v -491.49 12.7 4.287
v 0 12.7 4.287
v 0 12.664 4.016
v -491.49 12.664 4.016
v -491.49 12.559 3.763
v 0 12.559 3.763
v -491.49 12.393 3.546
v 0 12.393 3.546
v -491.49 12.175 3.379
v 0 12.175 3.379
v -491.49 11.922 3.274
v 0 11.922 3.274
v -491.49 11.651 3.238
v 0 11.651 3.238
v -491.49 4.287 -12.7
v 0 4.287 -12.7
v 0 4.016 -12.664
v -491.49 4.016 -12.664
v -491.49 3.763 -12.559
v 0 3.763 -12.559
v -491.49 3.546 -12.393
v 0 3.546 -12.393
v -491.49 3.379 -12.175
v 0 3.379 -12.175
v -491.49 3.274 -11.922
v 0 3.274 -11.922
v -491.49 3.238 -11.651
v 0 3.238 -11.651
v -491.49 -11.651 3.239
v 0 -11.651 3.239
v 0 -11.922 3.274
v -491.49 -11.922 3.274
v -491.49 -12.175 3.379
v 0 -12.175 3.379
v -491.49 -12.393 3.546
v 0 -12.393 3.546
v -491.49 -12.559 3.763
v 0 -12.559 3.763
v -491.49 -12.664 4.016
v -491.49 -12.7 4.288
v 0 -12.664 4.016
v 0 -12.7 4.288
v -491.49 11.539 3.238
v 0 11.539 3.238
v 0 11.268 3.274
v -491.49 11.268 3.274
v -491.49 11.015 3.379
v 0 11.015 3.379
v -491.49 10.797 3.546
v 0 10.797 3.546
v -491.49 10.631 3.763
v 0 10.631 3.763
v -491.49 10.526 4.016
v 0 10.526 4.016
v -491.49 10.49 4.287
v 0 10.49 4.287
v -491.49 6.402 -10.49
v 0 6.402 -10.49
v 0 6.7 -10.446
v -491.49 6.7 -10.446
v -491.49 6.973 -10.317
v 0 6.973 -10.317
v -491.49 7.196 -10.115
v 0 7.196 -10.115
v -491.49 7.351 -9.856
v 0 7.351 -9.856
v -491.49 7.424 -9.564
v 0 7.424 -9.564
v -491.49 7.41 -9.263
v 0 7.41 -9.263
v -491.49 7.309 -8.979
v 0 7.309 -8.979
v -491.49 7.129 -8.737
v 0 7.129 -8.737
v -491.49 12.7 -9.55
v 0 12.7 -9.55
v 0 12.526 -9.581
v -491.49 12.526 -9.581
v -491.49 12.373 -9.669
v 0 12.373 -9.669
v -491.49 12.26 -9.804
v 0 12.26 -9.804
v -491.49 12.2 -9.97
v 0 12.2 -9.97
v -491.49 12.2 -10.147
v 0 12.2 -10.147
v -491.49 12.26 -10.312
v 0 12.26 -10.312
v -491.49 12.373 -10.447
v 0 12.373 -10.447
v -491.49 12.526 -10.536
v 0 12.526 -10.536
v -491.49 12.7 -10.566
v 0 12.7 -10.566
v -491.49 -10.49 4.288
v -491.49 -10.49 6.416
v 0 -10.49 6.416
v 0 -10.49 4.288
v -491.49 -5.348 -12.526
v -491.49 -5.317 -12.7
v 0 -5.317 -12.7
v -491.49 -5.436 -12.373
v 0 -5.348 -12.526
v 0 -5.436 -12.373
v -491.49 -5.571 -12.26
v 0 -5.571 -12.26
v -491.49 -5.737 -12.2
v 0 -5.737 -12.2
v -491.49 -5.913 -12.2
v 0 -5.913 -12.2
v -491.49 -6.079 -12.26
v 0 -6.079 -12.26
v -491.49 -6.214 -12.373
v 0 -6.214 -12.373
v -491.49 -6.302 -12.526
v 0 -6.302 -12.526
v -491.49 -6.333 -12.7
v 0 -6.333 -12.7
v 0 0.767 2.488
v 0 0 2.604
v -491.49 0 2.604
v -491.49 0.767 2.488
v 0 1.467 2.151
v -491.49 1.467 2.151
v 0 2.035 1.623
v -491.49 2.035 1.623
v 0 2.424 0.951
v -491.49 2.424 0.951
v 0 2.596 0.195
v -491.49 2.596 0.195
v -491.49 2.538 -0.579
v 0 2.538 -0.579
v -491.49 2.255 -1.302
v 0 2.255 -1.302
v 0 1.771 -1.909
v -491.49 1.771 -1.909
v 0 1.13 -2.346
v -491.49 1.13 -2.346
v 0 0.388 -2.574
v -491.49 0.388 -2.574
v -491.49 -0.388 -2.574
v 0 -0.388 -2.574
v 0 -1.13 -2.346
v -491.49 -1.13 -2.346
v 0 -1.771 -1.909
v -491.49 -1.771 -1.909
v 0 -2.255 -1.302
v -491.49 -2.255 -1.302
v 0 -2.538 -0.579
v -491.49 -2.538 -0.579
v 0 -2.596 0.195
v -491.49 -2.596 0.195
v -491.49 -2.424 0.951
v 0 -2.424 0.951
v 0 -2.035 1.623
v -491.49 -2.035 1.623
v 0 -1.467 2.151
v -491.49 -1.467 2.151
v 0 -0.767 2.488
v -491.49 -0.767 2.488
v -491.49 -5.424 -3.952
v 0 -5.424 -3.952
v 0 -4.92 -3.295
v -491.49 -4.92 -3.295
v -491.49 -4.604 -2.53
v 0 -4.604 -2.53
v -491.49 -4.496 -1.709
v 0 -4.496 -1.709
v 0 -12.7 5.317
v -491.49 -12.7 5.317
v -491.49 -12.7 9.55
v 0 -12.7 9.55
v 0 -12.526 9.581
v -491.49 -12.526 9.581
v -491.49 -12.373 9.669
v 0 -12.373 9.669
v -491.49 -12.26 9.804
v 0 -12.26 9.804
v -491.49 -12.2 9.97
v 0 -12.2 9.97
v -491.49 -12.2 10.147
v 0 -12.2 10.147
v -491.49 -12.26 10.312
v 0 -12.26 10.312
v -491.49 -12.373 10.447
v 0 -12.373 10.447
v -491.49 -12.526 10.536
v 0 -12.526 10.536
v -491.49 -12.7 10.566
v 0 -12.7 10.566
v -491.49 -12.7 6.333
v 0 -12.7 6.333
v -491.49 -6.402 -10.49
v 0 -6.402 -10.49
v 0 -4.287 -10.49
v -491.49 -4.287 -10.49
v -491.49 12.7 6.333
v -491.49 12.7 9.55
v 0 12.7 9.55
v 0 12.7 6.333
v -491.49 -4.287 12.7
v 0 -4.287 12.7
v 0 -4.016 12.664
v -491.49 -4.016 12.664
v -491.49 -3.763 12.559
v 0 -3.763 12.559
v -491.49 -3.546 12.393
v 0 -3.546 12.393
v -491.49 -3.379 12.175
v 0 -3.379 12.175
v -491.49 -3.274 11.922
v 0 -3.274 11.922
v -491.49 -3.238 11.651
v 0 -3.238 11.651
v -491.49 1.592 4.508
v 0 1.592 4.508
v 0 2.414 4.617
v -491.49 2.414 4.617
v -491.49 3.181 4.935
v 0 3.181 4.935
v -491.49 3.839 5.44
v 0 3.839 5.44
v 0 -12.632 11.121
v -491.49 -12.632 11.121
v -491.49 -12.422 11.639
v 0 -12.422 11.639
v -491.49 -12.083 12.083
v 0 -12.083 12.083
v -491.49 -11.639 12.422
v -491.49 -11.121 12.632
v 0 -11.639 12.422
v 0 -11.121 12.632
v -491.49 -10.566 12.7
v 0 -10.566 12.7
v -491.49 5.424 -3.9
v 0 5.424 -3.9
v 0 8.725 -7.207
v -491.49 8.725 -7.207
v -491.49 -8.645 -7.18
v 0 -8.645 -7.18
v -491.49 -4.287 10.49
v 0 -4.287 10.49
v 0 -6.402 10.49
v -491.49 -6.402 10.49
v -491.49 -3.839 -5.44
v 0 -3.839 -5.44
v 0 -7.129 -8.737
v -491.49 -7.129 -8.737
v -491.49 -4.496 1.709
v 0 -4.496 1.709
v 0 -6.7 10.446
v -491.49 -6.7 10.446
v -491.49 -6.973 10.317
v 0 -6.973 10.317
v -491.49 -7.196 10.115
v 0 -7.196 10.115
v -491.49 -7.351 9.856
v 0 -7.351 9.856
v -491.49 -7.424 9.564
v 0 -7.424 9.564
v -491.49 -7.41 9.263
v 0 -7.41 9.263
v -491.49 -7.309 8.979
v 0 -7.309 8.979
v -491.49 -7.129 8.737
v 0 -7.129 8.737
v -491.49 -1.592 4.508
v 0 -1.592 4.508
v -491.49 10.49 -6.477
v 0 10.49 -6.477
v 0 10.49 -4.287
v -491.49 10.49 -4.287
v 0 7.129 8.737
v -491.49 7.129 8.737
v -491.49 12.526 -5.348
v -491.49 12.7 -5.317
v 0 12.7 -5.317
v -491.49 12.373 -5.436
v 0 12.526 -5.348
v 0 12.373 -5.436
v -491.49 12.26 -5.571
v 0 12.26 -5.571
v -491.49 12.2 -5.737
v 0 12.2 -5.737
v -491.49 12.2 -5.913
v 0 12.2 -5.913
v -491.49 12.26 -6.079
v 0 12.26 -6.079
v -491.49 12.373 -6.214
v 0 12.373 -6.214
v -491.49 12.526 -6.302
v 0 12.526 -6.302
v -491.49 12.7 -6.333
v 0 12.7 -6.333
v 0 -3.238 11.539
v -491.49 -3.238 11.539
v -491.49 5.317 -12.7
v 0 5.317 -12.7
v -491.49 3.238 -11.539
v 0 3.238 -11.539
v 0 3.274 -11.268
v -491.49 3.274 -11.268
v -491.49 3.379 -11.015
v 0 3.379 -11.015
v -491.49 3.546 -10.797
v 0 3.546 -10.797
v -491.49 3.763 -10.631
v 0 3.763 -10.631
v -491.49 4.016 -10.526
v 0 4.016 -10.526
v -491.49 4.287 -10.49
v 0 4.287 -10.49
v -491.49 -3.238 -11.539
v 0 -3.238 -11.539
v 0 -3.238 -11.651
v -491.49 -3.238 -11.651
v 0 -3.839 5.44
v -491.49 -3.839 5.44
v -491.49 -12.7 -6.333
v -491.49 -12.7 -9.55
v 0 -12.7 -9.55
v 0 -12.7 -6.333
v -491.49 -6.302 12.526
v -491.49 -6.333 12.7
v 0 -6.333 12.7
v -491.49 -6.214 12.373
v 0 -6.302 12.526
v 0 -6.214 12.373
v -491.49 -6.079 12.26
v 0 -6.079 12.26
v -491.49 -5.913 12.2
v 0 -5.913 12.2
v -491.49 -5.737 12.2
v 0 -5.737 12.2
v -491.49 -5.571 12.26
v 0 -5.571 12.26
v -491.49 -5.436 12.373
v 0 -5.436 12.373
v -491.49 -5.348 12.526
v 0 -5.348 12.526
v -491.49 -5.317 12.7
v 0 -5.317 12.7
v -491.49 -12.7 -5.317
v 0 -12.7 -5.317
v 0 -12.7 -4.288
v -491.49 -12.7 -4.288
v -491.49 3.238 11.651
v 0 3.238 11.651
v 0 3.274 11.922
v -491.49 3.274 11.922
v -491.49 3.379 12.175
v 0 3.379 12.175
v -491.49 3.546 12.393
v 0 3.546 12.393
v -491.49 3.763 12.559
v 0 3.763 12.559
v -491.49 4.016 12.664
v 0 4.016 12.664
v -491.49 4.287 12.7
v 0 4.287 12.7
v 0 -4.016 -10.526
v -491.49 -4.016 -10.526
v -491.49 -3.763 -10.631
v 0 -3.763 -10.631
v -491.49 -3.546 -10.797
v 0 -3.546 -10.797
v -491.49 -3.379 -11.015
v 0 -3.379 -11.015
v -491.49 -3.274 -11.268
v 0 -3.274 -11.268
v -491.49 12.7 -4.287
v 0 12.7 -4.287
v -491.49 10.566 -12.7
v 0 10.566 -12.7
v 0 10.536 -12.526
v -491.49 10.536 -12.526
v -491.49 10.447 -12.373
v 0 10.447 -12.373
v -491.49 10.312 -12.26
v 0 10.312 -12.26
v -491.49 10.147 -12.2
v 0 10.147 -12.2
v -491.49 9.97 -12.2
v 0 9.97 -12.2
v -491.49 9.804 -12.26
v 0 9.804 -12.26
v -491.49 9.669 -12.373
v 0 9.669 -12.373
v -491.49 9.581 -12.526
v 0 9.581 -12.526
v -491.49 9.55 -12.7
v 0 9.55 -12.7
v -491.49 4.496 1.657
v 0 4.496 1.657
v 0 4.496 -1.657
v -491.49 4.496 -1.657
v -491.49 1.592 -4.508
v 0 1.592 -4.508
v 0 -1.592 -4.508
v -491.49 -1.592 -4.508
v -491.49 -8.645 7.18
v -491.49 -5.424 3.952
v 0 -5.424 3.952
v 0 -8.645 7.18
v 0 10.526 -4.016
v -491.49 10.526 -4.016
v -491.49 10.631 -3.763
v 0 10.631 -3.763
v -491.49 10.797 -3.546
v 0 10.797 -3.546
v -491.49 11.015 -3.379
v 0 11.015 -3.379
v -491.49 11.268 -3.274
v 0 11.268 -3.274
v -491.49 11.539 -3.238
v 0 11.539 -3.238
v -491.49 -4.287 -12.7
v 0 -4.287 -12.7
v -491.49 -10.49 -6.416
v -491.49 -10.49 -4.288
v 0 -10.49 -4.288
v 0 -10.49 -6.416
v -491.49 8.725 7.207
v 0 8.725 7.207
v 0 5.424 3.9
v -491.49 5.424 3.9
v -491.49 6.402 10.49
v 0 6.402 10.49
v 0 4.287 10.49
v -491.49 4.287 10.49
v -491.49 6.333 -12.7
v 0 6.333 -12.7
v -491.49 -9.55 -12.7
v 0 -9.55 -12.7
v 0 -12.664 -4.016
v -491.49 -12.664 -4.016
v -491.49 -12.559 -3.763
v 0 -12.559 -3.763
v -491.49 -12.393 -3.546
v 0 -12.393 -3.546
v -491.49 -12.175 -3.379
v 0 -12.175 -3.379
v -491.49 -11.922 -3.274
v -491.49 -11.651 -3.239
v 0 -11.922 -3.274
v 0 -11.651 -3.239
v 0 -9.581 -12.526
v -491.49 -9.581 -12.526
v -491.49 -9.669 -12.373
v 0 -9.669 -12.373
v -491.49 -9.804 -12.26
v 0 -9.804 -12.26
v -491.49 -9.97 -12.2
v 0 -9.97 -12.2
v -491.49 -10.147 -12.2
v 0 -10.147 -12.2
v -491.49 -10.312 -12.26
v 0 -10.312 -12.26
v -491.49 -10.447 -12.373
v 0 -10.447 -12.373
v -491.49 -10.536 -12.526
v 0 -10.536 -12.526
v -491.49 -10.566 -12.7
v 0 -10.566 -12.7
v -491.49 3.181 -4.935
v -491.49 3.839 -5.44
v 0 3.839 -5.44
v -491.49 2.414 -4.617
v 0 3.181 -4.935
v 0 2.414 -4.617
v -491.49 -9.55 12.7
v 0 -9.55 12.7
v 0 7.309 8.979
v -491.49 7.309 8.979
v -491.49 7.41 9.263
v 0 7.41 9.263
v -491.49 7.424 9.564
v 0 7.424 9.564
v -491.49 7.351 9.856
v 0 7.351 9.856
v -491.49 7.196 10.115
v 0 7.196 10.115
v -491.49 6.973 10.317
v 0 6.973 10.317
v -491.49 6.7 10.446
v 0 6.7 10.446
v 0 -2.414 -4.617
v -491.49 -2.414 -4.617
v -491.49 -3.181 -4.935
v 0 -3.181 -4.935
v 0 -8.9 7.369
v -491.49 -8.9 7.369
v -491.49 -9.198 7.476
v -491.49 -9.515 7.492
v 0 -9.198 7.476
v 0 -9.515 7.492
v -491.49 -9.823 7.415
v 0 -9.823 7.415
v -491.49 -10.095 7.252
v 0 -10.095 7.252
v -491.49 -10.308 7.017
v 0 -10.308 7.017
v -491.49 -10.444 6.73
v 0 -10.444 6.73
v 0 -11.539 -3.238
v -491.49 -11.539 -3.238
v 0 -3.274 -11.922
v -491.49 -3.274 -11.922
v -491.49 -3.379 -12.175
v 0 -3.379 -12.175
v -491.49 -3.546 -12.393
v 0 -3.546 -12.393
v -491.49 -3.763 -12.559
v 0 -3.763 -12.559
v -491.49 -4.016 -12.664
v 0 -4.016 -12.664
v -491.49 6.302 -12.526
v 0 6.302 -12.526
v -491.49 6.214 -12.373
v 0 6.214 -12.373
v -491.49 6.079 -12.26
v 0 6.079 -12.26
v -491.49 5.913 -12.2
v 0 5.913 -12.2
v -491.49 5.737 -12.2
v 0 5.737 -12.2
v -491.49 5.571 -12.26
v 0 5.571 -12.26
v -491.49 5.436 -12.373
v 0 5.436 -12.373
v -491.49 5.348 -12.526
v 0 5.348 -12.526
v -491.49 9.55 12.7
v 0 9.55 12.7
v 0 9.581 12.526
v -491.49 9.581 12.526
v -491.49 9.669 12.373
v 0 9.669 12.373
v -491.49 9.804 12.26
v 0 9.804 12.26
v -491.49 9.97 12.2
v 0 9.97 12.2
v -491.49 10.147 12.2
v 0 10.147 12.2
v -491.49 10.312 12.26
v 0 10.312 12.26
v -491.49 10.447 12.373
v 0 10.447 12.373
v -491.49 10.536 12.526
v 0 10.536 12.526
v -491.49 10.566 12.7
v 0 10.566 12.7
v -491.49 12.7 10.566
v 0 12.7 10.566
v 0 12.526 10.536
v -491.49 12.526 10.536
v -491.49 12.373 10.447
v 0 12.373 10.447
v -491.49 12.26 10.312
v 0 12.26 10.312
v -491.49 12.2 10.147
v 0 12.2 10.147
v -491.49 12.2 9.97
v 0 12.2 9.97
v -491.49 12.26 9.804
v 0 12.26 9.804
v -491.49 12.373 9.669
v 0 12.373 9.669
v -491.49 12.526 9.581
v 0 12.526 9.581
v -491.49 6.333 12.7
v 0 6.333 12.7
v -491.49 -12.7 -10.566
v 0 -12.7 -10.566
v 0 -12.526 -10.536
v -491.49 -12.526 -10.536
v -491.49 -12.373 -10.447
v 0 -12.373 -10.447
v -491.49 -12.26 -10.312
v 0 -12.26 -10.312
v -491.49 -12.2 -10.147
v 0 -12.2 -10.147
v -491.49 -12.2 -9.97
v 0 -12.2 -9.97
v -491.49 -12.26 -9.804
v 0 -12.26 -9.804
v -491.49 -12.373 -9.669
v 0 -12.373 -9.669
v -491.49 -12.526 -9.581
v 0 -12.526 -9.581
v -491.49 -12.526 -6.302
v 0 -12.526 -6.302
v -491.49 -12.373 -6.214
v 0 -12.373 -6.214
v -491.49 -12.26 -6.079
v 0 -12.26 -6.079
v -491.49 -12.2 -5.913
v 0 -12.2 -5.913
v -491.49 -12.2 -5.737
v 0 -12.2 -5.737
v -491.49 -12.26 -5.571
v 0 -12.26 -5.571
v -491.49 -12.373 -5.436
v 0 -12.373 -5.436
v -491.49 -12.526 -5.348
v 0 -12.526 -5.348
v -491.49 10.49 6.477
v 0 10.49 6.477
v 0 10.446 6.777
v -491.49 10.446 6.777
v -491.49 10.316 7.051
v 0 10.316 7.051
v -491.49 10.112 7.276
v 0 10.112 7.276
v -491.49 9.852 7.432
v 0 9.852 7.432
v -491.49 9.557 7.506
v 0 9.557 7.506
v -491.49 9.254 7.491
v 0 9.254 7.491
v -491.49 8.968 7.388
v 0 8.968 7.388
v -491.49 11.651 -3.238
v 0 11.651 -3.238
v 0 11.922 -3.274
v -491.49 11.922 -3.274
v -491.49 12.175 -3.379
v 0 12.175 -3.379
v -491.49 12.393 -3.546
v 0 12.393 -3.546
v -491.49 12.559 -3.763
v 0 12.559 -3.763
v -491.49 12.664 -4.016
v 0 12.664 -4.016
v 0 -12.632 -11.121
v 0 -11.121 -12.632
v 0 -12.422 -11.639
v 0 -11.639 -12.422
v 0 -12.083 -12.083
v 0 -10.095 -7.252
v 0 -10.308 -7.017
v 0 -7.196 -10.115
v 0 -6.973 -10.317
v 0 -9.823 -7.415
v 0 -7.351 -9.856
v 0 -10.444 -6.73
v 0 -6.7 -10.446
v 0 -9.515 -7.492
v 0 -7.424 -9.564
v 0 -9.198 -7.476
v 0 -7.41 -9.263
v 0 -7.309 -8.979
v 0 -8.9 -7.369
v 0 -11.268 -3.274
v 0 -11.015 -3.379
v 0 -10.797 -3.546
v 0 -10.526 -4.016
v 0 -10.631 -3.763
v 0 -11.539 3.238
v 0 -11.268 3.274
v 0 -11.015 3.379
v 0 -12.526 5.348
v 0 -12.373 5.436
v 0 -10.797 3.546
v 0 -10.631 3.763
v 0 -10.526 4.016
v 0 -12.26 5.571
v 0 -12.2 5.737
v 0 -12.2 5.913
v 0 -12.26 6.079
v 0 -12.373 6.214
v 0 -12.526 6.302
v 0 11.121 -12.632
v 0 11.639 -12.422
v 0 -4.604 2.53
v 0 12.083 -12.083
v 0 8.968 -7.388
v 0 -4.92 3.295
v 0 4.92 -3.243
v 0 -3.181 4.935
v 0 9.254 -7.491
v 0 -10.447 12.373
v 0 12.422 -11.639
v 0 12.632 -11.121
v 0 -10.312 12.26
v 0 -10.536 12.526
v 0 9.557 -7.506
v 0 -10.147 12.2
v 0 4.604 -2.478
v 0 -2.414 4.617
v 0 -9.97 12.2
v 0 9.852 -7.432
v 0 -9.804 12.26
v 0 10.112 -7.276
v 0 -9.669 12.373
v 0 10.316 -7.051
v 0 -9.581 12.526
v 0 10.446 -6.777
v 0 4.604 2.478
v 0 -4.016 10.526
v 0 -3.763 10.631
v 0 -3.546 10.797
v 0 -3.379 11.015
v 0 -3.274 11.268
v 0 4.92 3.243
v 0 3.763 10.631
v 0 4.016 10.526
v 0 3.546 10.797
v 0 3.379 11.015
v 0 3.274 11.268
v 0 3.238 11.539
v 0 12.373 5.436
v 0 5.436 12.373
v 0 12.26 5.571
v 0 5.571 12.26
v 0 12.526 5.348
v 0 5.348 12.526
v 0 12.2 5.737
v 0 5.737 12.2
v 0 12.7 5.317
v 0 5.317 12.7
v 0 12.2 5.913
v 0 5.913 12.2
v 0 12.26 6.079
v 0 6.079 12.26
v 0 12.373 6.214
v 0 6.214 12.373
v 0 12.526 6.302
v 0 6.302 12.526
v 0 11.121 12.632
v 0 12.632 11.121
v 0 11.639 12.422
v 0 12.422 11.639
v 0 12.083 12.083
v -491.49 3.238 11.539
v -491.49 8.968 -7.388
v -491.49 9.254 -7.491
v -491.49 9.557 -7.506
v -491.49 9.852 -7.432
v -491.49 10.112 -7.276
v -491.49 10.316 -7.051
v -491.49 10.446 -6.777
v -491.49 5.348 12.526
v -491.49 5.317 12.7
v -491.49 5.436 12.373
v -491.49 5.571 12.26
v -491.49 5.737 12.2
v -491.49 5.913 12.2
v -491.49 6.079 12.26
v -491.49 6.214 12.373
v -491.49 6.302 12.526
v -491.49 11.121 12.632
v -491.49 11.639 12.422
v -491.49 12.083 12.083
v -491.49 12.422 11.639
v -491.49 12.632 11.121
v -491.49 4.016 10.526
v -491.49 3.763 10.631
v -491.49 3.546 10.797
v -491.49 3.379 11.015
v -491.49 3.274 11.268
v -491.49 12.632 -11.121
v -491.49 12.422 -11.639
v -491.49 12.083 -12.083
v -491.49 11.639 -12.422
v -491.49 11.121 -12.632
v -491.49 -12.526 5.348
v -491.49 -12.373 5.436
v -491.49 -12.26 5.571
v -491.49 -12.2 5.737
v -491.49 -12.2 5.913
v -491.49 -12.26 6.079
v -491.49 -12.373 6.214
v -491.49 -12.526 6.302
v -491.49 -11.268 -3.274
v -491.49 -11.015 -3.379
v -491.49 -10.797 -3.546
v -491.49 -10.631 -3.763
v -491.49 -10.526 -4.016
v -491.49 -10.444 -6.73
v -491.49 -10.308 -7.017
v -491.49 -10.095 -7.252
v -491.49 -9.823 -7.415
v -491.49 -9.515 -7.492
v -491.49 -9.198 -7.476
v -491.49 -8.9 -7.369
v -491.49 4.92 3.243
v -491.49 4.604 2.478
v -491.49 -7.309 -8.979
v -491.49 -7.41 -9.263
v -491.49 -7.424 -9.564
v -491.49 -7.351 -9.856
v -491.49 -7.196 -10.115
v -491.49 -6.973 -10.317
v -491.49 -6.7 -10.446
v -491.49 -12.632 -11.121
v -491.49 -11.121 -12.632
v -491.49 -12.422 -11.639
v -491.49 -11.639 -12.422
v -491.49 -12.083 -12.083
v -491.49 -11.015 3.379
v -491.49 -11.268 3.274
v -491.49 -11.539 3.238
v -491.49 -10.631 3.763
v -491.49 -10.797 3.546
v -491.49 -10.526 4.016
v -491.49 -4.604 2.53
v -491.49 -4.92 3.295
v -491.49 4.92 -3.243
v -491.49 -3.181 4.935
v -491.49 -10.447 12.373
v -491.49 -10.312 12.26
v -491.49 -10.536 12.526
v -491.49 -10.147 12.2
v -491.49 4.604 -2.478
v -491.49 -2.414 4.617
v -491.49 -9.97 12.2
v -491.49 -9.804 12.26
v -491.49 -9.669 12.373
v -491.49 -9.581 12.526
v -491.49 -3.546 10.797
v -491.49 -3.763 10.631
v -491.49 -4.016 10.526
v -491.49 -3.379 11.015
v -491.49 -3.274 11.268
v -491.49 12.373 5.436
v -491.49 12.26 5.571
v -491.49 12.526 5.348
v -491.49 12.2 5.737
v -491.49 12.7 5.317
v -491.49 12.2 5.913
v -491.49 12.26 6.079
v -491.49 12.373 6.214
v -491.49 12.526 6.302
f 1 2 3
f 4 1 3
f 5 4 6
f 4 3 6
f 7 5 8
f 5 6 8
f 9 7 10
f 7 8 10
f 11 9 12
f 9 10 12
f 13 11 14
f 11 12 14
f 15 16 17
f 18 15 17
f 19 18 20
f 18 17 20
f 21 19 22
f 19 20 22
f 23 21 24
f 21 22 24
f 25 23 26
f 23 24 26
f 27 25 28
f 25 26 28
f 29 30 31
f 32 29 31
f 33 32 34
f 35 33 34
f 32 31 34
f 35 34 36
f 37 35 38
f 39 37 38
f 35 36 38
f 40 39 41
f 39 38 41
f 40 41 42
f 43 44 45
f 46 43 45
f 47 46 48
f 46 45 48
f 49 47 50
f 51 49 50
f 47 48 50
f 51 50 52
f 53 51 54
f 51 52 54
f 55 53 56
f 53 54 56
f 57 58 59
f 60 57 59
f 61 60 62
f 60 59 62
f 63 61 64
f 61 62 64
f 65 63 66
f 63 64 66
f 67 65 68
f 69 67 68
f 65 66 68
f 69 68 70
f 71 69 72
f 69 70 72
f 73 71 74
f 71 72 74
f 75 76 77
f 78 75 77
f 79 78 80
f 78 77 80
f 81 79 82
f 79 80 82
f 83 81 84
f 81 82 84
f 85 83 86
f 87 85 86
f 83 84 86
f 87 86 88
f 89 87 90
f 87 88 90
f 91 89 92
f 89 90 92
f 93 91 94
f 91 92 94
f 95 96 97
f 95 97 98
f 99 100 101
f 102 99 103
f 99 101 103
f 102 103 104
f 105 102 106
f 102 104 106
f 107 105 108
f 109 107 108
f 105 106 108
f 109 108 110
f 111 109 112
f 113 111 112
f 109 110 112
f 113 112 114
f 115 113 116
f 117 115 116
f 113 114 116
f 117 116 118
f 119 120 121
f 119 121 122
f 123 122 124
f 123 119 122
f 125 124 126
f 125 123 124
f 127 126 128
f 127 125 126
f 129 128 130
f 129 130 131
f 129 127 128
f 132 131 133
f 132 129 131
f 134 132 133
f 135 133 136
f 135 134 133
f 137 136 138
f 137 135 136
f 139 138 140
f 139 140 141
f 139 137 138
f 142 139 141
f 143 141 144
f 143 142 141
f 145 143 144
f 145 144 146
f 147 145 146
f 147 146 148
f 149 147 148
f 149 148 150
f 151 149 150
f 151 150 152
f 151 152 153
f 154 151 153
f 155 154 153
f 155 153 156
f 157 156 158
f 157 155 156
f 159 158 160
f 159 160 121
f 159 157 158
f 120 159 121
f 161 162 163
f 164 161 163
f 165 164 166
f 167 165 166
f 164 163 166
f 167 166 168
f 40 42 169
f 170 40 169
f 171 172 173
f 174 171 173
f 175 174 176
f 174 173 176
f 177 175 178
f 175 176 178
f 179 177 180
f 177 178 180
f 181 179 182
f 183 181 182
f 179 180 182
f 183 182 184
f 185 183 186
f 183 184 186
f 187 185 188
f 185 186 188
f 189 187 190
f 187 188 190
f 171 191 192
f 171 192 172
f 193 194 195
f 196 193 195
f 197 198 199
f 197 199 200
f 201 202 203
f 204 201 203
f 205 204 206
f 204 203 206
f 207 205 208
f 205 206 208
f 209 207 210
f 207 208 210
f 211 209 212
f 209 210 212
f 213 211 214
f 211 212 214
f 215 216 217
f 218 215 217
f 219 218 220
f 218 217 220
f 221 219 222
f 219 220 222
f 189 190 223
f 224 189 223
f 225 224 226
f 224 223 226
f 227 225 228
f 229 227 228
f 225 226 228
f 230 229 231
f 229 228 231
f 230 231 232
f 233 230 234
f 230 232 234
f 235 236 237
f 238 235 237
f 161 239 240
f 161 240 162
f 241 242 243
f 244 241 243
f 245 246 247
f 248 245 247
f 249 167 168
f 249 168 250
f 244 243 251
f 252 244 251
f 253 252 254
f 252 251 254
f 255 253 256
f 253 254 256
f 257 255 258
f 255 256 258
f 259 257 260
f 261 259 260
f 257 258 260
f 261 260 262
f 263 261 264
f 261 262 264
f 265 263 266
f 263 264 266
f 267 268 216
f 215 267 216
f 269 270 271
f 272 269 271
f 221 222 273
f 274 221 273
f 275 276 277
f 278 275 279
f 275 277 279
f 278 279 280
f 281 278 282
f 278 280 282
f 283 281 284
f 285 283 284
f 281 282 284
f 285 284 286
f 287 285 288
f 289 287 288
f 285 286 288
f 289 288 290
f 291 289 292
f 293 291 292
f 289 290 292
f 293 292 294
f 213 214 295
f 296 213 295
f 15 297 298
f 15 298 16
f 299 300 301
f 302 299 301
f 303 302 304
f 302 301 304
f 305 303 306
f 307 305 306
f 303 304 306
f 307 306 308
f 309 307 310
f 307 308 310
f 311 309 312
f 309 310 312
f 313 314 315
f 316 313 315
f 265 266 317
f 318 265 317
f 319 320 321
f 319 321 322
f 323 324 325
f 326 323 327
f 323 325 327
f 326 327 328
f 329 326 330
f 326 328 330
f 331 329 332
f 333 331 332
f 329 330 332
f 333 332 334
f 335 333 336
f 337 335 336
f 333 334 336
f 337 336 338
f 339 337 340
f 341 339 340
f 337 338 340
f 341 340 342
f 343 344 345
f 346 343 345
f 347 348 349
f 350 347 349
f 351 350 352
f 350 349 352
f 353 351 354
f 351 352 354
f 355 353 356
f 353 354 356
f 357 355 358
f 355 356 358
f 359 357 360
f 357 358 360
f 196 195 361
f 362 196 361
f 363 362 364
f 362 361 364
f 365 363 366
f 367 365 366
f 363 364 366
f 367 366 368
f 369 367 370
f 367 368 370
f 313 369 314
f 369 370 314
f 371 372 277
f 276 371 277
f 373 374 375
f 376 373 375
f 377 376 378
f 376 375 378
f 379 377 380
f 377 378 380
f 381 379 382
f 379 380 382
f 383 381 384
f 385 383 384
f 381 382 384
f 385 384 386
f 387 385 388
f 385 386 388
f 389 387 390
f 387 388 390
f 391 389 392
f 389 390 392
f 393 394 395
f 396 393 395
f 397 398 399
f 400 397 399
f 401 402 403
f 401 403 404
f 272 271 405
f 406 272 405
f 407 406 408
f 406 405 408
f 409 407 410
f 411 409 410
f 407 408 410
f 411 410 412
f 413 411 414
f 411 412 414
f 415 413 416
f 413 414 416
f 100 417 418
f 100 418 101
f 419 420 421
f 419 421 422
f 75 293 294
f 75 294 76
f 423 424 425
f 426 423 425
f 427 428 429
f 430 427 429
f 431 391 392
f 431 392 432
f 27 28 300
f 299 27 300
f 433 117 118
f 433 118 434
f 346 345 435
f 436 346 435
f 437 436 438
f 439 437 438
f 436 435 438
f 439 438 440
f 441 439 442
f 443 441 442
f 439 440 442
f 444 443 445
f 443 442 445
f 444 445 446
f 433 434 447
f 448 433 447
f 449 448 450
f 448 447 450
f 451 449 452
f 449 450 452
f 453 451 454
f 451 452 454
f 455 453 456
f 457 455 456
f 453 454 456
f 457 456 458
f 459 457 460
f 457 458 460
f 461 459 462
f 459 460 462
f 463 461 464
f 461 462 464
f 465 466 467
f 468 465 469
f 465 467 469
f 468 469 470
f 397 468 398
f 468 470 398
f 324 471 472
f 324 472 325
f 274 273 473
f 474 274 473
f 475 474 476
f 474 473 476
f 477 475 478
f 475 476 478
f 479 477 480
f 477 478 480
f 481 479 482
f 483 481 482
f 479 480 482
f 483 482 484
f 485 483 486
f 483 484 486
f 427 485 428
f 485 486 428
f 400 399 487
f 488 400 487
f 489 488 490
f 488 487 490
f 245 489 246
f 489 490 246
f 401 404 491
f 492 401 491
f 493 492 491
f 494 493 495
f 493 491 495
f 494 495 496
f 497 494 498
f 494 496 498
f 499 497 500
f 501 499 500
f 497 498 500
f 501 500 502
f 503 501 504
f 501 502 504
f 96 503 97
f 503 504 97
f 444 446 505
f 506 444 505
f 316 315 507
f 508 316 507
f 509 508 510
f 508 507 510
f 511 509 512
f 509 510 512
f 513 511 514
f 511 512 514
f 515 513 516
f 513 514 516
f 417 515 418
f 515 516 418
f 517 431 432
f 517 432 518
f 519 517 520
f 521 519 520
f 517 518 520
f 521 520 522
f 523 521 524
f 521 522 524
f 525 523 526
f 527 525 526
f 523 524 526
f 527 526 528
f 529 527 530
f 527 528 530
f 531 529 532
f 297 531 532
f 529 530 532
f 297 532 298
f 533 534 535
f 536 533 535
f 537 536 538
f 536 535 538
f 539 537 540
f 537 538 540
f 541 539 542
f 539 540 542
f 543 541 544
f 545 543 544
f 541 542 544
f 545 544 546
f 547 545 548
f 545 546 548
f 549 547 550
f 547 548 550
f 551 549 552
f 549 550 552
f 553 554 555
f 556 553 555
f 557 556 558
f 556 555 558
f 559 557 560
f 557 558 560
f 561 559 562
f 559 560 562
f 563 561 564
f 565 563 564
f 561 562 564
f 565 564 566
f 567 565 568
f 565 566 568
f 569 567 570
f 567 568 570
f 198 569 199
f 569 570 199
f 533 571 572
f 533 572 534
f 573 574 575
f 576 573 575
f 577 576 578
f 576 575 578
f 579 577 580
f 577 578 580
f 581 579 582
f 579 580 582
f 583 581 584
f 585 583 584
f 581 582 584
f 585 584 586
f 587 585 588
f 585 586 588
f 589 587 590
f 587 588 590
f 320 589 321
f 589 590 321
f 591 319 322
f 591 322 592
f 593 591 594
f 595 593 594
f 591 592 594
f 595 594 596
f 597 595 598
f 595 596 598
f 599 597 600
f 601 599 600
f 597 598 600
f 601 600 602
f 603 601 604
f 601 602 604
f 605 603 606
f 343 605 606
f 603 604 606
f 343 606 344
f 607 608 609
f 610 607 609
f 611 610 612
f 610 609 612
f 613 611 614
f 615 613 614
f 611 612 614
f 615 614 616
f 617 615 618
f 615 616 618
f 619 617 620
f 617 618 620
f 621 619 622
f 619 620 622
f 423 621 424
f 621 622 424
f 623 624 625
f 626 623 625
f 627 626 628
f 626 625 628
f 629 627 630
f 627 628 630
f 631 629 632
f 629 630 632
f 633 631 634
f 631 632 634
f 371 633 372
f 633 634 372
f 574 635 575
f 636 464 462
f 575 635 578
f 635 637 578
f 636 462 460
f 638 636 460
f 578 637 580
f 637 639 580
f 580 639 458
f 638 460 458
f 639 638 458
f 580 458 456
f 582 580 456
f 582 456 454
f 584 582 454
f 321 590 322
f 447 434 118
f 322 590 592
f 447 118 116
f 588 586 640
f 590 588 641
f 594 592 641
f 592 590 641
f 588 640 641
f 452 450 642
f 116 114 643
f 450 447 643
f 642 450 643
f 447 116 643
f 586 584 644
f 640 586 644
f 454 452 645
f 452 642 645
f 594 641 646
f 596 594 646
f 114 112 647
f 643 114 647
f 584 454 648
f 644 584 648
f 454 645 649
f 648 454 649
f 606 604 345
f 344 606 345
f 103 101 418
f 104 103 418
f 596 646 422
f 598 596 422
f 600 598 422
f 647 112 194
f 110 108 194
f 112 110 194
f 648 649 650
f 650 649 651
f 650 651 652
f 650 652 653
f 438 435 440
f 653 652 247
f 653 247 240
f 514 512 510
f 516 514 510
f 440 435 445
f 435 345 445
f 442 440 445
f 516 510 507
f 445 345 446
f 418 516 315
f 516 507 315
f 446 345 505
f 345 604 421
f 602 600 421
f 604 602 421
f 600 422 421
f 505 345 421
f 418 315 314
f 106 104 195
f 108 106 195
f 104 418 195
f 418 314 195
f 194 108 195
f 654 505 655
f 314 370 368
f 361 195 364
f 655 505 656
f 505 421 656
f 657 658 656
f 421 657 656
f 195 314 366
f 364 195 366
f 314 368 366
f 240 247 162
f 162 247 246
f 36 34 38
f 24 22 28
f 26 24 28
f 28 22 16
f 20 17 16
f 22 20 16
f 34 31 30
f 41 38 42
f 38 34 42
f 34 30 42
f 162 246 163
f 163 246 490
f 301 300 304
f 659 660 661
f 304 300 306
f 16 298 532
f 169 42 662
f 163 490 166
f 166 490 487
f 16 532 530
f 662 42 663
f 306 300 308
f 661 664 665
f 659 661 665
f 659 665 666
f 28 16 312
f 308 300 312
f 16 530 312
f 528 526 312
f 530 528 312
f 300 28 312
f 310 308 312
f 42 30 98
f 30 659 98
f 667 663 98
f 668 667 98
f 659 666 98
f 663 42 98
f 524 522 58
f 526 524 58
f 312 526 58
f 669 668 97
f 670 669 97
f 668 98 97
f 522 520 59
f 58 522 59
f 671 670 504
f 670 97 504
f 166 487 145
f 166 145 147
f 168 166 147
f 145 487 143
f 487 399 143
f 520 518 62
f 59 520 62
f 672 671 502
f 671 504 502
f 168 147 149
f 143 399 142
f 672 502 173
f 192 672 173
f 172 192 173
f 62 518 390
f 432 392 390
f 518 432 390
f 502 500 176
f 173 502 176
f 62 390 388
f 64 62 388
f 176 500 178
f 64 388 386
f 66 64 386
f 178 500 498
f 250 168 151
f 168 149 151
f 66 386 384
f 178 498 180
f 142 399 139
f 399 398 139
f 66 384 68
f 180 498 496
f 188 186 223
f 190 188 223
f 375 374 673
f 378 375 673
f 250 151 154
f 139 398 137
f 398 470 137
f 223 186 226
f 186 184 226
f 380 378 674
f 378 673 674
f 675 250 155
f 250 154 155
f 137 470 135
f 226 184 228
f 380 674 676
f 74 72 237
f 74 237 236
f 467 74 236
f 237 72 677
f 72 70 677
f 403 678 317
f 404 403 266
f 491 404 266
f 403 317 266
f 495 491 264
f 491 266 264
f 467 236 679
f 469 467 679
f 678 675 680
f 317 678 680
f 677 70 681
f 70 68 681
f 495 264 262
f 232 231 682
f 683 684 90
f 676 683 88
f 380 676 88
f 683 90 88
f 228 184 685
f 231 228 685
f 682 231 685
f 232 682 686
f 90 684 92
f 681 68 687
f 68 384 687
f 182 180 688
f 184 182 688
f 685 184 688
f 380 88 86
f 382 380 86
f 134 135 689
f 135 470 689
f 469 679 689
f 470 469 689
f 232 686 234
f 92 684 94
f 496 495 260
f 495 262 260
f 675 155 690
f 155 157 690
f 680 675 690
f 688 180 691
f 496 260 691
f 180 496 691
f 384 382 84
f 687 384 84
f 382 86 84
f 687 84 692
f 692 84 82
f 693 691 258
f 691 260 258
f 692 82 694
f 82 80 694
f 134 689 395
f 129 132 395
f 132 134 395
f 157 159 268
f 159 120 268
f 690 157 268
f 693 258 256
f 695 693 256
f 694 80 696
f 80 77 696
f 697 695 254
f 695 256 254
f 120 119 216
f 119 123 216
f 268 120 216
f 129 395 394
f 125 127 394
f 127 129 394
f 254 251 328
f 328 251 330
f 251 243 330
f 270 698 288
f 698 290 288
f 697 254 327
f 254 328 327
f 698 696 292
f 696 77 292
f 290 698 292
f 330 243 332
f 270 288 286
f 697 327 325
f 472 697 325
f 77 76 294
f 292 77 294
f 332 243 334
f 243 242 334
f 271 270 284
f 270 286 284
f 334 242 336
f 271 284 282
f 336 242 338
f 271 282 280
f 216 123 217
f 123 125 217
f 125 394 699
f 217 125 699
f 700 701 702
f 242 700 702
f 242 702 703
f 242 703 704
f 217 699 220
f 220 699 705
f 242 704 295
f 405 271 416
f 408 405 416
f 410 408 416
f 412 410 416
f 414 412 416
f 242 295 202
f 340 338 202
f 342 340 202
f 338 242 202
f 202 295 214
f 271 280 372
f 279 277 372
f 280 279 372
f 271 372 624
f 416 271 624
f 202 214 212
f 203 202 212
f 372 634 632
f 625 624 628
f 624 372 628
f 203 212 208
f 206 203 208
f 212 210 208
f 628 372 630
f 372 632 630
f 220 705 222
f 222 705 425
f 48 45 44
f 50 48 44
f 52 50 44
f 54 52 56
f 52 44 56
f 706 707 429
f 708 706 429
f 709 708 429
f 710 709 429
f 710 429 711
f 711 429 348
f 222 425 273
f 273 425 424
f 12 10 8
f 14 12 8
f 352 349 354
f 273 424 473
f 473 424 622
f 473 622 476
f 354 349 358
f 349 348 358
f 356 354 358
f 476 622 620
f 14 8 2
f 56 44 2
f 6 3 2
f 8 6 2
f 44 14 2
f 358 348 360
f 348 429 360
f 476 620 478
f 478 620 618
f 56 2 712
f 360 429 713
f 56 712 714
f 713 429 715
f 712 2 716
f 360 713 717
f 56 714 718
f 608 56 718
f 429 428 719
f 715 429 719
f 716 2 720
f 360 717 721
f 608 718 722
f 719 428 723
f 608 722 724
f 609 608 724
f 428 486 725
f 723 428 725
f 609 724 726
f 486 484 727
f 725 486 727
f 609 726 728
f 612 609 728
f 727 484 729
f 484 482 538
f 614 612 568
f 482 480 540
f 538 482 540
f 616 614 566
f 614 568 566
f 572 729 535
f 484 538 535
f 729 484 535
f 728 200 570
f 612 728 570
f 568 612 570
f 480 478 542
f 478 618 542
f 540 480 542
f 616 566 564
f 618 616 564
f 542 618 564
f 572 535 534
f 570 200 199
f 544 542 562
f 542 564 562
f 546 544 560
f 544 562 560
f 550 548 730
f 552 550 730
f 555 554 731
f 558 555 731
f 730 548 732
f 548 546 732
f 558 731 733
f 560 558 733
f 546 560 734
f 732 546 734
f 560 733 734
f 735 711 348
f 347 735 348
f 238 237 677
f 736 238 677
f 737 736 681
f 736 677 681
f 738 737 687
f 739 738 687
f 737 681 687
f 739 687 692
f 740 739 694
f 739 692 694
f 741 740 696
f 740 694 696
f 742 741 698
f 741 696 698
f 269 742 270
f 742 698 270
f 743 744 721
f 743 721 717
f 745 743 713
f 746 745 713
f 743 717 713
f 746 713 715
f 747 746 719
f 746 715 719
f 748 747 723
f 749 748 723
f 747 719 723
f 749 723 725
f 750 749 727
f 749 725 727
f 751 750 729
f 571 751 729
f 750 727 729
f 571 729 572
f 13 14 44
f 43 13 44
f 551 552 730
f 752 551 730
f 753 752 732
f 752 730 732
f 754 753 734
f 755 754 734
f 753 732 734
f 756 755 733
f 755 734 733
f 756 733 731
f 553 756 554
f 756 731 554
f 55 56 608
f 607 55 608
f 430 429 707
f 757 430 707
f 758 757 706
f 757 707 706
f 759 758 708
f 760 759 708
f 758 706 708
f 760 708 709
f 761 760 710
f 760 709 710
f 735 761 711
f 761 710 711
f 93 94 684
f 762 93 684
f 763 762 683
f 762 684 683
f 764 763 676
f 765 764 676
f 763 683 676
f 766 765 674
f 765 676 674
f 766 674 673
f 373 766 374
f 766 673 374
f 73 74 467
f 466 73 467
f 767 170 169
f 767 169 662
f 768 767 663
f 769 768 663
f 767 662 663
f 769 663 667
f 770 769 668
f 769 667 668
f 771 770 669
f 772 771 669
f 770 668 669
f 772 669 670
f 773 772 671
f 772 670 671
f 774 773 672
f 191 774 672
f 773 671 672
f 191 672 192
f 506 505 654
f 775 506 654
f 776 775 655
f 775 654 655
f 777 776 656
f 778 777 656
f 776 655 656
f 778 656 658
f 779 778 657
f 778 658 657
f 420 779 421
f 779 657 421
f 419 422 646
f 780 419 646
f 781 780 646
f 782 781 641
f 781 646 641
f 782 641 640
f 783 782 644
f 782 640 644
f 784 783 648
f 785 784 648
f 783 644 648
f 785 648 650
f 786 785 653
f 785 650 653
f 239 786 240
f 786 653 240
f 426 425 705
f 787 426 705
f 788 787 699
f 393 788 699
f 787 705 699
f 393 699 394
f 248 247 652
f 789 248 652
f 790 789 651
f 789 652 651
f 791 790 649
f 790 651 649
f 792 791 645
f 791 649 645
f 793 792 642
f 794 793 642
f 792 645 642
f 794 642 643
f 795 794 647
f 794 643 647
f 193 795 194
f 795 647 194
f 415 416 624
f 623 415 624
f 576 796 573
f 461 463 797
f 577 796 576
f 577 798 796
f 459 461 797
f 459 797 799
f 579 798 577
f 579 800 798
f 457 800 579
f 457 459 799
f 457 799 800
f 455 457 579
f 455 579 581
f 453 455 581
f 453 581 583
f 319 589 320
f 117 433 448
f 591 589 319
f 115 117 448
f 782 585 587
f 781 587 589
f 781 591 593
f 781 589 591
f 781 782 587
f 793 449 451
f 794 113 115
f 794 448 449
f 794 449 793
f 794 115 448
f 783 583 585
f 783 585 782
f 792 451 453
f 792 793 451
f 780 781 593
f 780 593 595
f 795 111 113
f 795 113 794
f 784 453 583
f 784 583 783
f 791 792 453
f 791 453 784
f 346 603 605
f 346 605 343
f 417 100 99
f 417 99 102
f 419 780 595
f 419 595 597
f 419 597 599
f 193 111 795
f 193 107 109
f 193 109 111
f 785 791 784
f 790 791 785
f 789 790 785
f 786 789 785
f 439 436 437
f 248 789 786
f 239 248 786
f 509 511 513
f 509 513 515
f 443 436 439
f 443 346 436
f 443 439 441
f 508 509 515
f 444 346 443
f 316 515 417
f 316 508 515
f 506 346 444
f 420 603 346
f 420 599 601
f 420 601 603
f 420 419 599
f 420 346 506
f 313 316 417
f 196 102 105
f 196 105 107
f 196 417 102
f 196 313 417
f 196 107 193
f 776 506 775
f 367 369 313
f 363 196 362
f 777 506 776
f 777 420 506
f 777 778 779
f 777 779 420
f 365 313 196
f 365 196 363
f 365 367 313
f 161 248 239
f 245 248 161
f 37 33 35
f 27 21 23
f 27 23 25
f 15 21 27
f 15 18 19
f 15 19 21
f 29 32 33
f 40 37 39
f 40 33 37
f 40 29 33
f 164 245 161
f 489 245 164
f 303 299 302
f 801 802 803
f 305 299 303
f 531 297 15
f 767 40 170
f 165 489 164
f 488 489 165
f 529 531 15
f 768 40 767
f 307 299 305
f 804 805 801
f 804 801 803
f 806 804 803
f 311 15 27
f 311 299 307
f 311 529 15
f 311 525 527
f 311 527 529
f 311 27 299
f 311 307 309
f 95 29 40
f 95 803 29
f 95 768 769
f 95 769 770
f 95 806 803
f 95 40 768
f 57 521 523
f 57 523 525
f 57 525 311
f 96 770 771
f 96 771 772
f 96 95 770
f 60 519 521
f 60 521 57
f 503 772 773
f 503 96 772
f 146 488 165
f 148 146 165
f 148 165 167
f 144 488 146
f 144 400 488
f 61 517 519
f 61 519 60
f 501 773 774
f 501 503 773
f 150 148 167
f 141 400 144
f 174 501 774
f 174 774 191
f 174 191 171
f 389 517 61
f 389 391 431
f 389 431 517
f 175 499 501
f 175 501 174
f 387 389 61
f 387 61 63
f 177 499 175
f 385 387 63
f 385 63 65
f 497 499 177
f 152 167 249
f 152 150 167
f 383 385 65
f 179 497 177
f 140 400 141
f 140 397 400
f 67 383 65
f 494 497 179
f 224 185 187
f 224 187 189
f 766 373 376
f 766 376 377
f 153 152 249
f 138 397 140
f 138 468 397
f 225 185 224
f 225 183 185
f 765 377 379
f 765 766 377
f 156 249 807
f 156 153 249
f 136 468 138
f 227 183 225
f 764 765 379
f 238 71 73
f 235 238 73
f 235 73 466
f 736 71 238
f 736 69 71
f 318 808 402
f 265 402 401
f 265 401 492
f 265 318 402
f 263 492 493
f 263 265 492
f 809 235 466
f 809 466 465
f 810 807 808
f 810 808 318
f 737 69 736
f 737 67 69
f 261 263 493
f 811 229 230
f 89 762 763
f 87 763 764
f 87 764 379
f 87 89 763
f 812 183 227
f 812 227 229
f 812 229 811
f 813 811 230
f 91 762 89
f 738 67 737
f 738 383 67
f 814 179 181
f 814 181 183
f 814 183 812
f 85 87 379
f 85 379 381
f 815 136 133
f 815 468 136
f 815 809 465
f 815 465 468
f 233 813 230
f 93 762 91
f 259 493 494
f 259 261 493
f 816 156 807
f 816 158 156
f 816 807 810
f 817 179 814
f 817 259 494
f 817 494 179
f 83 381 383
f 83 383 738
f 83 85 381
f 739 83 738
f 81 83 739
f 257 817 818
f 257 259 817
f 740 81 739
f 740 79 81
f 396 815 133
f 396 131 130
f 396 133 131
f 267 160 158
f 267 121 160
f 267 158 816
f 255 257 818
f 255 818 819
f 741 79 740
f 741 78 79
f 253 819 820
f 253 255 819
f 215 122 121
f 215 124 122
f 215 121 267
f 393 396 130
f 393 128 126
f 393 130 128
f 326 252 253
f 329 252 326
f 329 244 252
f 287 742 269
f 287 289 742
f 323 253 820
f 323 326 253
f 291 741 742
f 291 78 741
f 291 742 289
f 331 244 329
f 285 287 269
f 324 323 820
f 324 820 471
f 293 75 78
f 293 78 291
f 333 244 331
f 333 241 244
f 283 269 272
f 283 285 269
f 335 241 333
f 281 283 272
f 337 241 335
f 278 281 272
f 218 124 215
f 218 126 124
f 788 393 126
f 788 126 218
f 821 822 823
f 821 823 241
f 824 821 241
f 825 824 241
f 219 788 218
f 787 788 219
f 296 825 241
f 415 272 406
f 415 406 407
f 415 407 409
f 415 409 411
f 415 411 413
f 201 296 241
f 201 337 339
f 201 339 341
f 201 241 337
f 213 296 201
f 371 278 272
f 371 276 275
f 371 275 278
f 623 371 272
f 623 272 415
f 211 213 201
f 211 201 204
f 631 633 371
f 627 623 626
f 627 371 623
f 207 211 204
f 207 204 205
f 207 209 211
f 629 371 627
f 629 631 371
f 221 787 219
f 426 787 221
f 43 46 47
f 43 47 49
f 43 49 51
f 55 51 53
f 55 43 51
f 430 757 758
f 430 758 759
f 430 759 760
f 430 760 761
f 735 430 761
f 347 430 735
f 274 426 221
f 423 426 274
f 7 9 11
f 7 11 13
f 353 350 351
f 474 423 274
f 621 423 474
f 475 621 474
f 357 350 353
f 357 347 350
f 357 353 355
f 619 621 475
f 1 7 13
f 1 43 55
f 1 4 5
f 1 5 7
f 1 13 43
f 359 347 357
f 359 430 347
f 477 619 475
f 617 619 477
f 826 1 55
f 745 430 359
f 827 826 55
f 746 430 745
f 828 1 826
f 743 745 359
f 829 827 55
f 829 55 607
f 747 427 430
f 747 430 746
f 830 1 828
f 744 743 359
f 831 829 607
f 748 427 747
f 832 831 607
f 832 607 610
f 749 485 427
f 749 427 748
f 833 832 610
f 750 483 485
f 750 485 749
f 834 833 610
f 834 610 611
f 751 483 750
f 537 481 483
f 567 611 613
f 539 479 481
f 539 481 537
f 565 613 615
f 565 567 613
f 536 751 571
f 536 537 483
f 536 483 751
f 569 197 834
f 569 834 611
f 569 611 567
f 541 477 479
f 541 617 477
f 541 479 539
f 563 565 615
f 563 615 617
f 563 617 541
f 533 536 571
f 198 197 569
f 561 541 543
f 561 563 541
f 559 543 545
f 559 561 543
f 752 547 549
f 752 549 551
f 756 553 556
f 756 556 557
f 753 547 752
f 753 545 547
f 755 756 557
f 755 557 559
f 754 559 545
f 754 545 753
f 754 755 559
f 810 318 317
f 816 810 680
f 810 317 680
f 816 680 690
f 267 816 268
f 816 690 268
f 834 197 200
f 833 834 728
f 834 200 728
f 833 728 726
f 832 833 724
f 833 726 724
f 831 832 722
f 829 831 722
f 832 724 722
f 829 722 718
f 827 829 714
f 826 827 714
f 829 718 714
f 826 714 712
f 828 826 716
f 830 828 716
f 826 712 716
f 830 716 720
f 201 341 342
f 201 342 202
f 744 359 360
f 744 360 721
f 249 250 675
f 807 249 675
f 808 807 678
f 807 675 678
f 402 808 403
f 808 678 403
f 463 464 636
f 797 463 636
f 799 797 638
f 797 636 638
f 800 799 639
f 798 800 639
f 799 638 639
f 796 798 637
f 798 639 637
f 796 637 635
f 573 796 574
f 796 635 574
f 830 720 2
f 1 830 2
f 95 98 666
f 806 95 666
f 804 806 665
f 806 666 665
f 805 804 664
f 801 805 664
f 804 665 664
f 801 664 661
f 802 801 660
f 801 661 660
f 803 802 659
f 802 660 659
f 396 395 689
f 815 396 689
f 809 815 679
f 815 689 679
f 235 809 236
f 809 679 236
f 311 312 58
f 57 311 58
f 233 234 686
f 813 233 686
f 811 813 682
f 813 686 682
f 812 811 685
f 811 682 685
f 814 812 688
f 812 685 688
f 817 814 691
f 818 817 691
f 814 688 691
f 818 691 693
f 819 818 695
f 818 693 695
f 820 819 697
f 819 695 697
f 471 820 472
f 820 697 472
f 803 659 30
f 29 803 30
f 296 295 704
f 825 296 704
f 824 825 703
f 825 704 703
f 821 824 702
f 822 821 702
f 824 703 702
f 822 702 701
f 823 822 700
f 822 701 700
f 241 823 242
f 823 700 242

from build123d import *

# Parameters (mm, degrees)
SKETCH14_R                = 2.6035
F_10_1010_PROFILE_1_DEPTH = 491.49


with BuildPart() as part:
    # Sketch14 → 10 1010 PROFILE(1) (new body)
    with BuildSketch(Plane.ZY):
        with BuildLine():
            Line((-1.709253557, -4.4958), (1.709253557, -4.4958))
            ThreePointArc((1.709253557, -4.4958), (2.922935876, -4.736928798), (3.95226937, -5.423689619))
            Line((3.95226937, -5.423689619), (7.179652728, -8.645192207))
            ThreePointArc((7.179652728, -8.645192207), (7.414733441, -9.822812921), (6.41641086, -10.4902))
            Line((6.41641086, -10.4902), (4.28752, -10.4902))
            ThreePointArc((4.28752, -10.4902), (3.545750844, -10.797450844), (3.2385, -11.53922))
            Line((3.2385, -11.53922), (3.2385, -11.65098))
            ThreePointArc((3.2385, -11.65098), (3.545750844, -12.392749156), (4.28752, -12.7))
            Line((4.28752, -12.7), (5.3171344, -12.7))
            ThreePointArc((5.3171344, -12.7), (5.8251344, -12.192), (6.3331344, -12.7))
            Line((6.3331344, -12.7), (9.5504, -12.7))
            ThreePointArc((9.5504, -12.7), (10.058323491, -12.192000006), (10.566399977, -12.699846982))
            ThreePointArc((10.566399977, -12.699846982), (12.082522516, -12.082522516), (12.699846982, -10.566399977))
            ThreePointArc((12.699846982, -10.566399977), (12.192000006, -10.058323491), (12.7, -9.5504))
            Line((12.7, -9.5504), (12.7, -6.3330836))
            ThreePointArc((12.7, -6.3330836), (12.192, -5.8250836), (12.7, -5.3170836))
            Line((12.7, -5.3170836), (12.7, -4.287470133))
            ThreePointArc((12.7, -4.287470133), (12.392749156, -3.545700977), (11.65098, -3.238450133))
            Line((11.65098, -3.238450133), (11.53922, -3.238450133))
            ThreePointArc((11.53922, -3.238450133), (10.797450844, -3.545700977), (10.4902, -4.287470133))
            Line((10.4902, -4.287470133), (10.4902, -6.402089023))
            ThreePointArc((10.4902, -6.402089023), (9.856394933, -7.351113629), (8.736962546, -7.129240479))
            Line((8.736962546, -7.129240479), (5.440484187, -3.838768792))
            ThreePointArc((5.440484187, -3.838768792), (4.75073678, -2.808015636), (4.5085, -1.591658411))
            Line((4.5085, -1.591658411), (4.5085, 1.591658411))
            ThreePointArc((4.5085, 1.591658411), (4.75073678, 2.808015636), (5.440484187, 3.838768792))
            Line((5.440484187, 3.838768792), (8.736962546, 7.129240479))
            ThreePointArc((8.736962546, 7.129240479), (9.856394933, 7.351113629), (10.4902, 6.402089023))
            Line((10.4902, 6.402089023), (10.4902, 4.287470133))
            ThreePointArc((10.4902, 4.287470133), (10.797450844, 3.545700977), (11.53922, 3.238450133))
            Line((11.53922, 3.238450133), (11.65098, 3.238450133))
            ThreePointArc((11.65098, 3.238450133), (12.392749156, 3.545700977), (12.7, 4.287470133))
            Line((12.7, 4.287470133), (12.7, 5.3171344))
            ThreePointArc((12.7, 5.3171344), (12.192, 5.8251344), (12.7, 6.3331344))
            Line((12.7, 6.3331344), (12.7, 9.5504))
            ThreePointArc((12.7, 9.5504), (12.192000006, 10.058323491), (12.699846982, 10.566399977))
            ThreePointArc((12.699846982, 10.566399977), (12.082522516, 12.082522516), (10.566399977, 12.699846982))
            ThreePointArc((10.566399977, 12.699846982), (10.058323491, 12.192000006), (9.5504, 12.7))
            Line((9.5504, 12.7), (6.3330836, 12.7))
            ThreePointArc((6.3330836, 12.7), (5.8250836, 12.192), (5.3170836, 12.7))
            Line((5.3170836, 12.7), (4.2874692, 12.7))
            ThreePointArc((4.2874692, 12.7), (3.545700044, 12.392749156), (3.2384492, 11.65098))
            Line((3.2384492, 11.65098), (3.2384492, 11.53922))
            ThreePointArc((3.2384492, 11.53922), (3.545700044, 10.797450844), (4.2874692, 10.4902))
            Line((4.2874692, 10.4902), (6.476774195, 10.4902))
            ThreePointArc((6.476774195, 10.4902), (7.43216212, 9.851515102), (7.207191475, 8.724540082))
            Line((7.207191475, 8.724540082), (3.900315394, 5.423689619))
            ThreePointArc((3.900315394, 5.423689619), (2.8709819, 4.736928798), (1.657299581, 4.4958))
            Line((1.657299581, 4.4958), (-1.657299581, 4.4958))
            ThreePointArc((-1.657299581, 4.4958), (-2.8709819, 4.736928798), (-3.900315394, 5.423689619))
            Line((-3.900315394, 5.423689619), (-7.207191475, 8.724540082))
            ThreePointArc((-7.207191475, 8.724540082), (-7.43216212, 9.851515102), (-6.476774195, 10.4902))
            Line((-6.476774195, 10.4902), (-4.2874692, 10.4902))
            ThreePointArc((-4.2874692, 10.4902), (-3.545700044, 10.797450844), (-3.2384492, 11.53922))
            Line((-3.2384492, 11.53922), (-3.2384492, 11.65098))
            ThreePointArc((-3.2384492, 11.65098), (-3.545700044, 12.392749156), (-4.2874692, 12.7))
            Line((-4.2874692, 12.7), (-5.3170836, 12.7))
            ThreePointArc((-5.3170836, 12.7), (-5.8250836, 12.192), (-6.3330836, 12.7))
            Line((-6.3330836, 12.7), (-9.5504, 12.7))
            ThreePointArc((-9.5504, 12.7), (-10.058323491, 12.192000006), (-10.566399977, 12.699846982))
            ThreePointArc((-10.566399977, 12.699846982), (-12.082522516, 12.082522516), (-12.699846982, 10.566399977))
            ThreePointArc((-12.699846982, 10.566399977), (-12.192000006, 10.058323491), (-12.7, 9.5504))
            Line((-12.7, 9.5504), (-12.7, 6.3331344))
            ThreePointArc((-12.7, 6.3331344), (-12.192, 5.8251344), (-12.7, 5.3171344))
            Line((-12.7, 5.3171344), (-12.7, 4.287470133))
            ThreePointArc((-12.7, 4.287470133), (-12.392749156, 3.545700977), (-11.65098, 3.238450133))
            Line((-11.65098, 3.238450133), (-11.53922, 3.238450133))
            ThreePointArc((-11.53922, 3.238450133), (-10.797450844, 3.545700977), (-10.4902, 4.287470133))
            Line((-10.4902, 4.287470133), (-10.4902, 6.402089023))
            ThreePointArc((-10.4902, 6.402089023), (-9.856394933, 7.351113629), (-8.736962546, 7.129240479))
            Line((-8.736962546, 7.129240479), (-5.440484187, 3.838768792))
            ThreePointArc((-5.440484187, 3.838768792), (-4.75073678, 2.808015636), (-4.5085, 1.591658411))
            Line((-4.5085, 1.591658411), (-4.5085, -1.591658411))
            ThreePointArc((-4.5085, -1.591658411), (-4.75073678, -2.808015636), (-5.440484187, -3.838768792))
            Line((-5.440484187, -3.838768792), (-8.736962546, -7.129240479))
            ThreePointArc((-8.736962546, -7.129240479), (-9.856394933, -7.351113629), (-10.4902, -6.402089023))
            Line((-10.4902, -6.402089023), (-10.4902, -4.287470133))
            ThreePointArc((-10.4902, -4.287470133), (-10.797450844, -3.545700977), (-11.53922, -3.238450133))
            Line((-11.53922, -3.238450133), (-11.65098, -3.238450133))
            ThreePointArc((-11.65098, -3.238450133), (-12.392749156, -3.545700977), (-12.7, -4.287470133))
            Line((-12.7, -4.287470133), (-12.7, -5.3170836))
            ThreePointArc((-12.7, -5.3170836), (-12.192, -5.8250836), (-12.7, -6.3330836))
            Line((-12.7, -6.3330836), (-12.7, -9.5504))
            ThreePointArc((-12.7, -9.5504), (-12.192000006, -10.058323491), (-12.699846982, -10.566399977))
            ThreePointArc((-12.699846982, -10.566399977), (-12.082522516, -12.082522516), (-10.566399977, -12.699846982))
            ThreePointArc((-10.566399977, -12.699846982), (-10.058323491, -12.192000006), (-9.5504, -12.7))
            Line((-9.5504, -12.7), (-6.3331344, -12.7))
            ThreePointArc((-6.3331344, -12.7), (-5.8251344, -12.192), (-5.3171344, -12.7))
            Line((-5.3171344, -12.7), (-4.28752, -12.7))
            ThreePointArc((-4.28752, -12.7), (-3.545750844, -12.392749156), (-3.2385, -11.65098))
            Line((-3.2385, -11.65098), (-3.2385, -11.53922))
            ThreePointArc((-3.2385, -11.53922), (-3.545750844, -10.797450844), (-4.28752, -10.4902))
            Line((-4.28752, -10.4902), (-6.41641086, -10.4902))
            ThreePointArc((-6.41641086, -10.4902), (-7.414733441, -9.822812921), (-7.179652728, -8.645192207))
            Line((-7.179652728, -8.645192207), (-3.95226937, -5.423689619))
            ThreePointArc((-3.95226937, -5.423689619), (-2.922935876, -4.736928798), (-1.709253557, -4.4958))
        make_face()
        Circle(SKETCH14_R, mode=Mode.SUBTRACT)
    extrude(amount=F_10_1010_PROFILE_1_DEPTH)


solid = part.part
